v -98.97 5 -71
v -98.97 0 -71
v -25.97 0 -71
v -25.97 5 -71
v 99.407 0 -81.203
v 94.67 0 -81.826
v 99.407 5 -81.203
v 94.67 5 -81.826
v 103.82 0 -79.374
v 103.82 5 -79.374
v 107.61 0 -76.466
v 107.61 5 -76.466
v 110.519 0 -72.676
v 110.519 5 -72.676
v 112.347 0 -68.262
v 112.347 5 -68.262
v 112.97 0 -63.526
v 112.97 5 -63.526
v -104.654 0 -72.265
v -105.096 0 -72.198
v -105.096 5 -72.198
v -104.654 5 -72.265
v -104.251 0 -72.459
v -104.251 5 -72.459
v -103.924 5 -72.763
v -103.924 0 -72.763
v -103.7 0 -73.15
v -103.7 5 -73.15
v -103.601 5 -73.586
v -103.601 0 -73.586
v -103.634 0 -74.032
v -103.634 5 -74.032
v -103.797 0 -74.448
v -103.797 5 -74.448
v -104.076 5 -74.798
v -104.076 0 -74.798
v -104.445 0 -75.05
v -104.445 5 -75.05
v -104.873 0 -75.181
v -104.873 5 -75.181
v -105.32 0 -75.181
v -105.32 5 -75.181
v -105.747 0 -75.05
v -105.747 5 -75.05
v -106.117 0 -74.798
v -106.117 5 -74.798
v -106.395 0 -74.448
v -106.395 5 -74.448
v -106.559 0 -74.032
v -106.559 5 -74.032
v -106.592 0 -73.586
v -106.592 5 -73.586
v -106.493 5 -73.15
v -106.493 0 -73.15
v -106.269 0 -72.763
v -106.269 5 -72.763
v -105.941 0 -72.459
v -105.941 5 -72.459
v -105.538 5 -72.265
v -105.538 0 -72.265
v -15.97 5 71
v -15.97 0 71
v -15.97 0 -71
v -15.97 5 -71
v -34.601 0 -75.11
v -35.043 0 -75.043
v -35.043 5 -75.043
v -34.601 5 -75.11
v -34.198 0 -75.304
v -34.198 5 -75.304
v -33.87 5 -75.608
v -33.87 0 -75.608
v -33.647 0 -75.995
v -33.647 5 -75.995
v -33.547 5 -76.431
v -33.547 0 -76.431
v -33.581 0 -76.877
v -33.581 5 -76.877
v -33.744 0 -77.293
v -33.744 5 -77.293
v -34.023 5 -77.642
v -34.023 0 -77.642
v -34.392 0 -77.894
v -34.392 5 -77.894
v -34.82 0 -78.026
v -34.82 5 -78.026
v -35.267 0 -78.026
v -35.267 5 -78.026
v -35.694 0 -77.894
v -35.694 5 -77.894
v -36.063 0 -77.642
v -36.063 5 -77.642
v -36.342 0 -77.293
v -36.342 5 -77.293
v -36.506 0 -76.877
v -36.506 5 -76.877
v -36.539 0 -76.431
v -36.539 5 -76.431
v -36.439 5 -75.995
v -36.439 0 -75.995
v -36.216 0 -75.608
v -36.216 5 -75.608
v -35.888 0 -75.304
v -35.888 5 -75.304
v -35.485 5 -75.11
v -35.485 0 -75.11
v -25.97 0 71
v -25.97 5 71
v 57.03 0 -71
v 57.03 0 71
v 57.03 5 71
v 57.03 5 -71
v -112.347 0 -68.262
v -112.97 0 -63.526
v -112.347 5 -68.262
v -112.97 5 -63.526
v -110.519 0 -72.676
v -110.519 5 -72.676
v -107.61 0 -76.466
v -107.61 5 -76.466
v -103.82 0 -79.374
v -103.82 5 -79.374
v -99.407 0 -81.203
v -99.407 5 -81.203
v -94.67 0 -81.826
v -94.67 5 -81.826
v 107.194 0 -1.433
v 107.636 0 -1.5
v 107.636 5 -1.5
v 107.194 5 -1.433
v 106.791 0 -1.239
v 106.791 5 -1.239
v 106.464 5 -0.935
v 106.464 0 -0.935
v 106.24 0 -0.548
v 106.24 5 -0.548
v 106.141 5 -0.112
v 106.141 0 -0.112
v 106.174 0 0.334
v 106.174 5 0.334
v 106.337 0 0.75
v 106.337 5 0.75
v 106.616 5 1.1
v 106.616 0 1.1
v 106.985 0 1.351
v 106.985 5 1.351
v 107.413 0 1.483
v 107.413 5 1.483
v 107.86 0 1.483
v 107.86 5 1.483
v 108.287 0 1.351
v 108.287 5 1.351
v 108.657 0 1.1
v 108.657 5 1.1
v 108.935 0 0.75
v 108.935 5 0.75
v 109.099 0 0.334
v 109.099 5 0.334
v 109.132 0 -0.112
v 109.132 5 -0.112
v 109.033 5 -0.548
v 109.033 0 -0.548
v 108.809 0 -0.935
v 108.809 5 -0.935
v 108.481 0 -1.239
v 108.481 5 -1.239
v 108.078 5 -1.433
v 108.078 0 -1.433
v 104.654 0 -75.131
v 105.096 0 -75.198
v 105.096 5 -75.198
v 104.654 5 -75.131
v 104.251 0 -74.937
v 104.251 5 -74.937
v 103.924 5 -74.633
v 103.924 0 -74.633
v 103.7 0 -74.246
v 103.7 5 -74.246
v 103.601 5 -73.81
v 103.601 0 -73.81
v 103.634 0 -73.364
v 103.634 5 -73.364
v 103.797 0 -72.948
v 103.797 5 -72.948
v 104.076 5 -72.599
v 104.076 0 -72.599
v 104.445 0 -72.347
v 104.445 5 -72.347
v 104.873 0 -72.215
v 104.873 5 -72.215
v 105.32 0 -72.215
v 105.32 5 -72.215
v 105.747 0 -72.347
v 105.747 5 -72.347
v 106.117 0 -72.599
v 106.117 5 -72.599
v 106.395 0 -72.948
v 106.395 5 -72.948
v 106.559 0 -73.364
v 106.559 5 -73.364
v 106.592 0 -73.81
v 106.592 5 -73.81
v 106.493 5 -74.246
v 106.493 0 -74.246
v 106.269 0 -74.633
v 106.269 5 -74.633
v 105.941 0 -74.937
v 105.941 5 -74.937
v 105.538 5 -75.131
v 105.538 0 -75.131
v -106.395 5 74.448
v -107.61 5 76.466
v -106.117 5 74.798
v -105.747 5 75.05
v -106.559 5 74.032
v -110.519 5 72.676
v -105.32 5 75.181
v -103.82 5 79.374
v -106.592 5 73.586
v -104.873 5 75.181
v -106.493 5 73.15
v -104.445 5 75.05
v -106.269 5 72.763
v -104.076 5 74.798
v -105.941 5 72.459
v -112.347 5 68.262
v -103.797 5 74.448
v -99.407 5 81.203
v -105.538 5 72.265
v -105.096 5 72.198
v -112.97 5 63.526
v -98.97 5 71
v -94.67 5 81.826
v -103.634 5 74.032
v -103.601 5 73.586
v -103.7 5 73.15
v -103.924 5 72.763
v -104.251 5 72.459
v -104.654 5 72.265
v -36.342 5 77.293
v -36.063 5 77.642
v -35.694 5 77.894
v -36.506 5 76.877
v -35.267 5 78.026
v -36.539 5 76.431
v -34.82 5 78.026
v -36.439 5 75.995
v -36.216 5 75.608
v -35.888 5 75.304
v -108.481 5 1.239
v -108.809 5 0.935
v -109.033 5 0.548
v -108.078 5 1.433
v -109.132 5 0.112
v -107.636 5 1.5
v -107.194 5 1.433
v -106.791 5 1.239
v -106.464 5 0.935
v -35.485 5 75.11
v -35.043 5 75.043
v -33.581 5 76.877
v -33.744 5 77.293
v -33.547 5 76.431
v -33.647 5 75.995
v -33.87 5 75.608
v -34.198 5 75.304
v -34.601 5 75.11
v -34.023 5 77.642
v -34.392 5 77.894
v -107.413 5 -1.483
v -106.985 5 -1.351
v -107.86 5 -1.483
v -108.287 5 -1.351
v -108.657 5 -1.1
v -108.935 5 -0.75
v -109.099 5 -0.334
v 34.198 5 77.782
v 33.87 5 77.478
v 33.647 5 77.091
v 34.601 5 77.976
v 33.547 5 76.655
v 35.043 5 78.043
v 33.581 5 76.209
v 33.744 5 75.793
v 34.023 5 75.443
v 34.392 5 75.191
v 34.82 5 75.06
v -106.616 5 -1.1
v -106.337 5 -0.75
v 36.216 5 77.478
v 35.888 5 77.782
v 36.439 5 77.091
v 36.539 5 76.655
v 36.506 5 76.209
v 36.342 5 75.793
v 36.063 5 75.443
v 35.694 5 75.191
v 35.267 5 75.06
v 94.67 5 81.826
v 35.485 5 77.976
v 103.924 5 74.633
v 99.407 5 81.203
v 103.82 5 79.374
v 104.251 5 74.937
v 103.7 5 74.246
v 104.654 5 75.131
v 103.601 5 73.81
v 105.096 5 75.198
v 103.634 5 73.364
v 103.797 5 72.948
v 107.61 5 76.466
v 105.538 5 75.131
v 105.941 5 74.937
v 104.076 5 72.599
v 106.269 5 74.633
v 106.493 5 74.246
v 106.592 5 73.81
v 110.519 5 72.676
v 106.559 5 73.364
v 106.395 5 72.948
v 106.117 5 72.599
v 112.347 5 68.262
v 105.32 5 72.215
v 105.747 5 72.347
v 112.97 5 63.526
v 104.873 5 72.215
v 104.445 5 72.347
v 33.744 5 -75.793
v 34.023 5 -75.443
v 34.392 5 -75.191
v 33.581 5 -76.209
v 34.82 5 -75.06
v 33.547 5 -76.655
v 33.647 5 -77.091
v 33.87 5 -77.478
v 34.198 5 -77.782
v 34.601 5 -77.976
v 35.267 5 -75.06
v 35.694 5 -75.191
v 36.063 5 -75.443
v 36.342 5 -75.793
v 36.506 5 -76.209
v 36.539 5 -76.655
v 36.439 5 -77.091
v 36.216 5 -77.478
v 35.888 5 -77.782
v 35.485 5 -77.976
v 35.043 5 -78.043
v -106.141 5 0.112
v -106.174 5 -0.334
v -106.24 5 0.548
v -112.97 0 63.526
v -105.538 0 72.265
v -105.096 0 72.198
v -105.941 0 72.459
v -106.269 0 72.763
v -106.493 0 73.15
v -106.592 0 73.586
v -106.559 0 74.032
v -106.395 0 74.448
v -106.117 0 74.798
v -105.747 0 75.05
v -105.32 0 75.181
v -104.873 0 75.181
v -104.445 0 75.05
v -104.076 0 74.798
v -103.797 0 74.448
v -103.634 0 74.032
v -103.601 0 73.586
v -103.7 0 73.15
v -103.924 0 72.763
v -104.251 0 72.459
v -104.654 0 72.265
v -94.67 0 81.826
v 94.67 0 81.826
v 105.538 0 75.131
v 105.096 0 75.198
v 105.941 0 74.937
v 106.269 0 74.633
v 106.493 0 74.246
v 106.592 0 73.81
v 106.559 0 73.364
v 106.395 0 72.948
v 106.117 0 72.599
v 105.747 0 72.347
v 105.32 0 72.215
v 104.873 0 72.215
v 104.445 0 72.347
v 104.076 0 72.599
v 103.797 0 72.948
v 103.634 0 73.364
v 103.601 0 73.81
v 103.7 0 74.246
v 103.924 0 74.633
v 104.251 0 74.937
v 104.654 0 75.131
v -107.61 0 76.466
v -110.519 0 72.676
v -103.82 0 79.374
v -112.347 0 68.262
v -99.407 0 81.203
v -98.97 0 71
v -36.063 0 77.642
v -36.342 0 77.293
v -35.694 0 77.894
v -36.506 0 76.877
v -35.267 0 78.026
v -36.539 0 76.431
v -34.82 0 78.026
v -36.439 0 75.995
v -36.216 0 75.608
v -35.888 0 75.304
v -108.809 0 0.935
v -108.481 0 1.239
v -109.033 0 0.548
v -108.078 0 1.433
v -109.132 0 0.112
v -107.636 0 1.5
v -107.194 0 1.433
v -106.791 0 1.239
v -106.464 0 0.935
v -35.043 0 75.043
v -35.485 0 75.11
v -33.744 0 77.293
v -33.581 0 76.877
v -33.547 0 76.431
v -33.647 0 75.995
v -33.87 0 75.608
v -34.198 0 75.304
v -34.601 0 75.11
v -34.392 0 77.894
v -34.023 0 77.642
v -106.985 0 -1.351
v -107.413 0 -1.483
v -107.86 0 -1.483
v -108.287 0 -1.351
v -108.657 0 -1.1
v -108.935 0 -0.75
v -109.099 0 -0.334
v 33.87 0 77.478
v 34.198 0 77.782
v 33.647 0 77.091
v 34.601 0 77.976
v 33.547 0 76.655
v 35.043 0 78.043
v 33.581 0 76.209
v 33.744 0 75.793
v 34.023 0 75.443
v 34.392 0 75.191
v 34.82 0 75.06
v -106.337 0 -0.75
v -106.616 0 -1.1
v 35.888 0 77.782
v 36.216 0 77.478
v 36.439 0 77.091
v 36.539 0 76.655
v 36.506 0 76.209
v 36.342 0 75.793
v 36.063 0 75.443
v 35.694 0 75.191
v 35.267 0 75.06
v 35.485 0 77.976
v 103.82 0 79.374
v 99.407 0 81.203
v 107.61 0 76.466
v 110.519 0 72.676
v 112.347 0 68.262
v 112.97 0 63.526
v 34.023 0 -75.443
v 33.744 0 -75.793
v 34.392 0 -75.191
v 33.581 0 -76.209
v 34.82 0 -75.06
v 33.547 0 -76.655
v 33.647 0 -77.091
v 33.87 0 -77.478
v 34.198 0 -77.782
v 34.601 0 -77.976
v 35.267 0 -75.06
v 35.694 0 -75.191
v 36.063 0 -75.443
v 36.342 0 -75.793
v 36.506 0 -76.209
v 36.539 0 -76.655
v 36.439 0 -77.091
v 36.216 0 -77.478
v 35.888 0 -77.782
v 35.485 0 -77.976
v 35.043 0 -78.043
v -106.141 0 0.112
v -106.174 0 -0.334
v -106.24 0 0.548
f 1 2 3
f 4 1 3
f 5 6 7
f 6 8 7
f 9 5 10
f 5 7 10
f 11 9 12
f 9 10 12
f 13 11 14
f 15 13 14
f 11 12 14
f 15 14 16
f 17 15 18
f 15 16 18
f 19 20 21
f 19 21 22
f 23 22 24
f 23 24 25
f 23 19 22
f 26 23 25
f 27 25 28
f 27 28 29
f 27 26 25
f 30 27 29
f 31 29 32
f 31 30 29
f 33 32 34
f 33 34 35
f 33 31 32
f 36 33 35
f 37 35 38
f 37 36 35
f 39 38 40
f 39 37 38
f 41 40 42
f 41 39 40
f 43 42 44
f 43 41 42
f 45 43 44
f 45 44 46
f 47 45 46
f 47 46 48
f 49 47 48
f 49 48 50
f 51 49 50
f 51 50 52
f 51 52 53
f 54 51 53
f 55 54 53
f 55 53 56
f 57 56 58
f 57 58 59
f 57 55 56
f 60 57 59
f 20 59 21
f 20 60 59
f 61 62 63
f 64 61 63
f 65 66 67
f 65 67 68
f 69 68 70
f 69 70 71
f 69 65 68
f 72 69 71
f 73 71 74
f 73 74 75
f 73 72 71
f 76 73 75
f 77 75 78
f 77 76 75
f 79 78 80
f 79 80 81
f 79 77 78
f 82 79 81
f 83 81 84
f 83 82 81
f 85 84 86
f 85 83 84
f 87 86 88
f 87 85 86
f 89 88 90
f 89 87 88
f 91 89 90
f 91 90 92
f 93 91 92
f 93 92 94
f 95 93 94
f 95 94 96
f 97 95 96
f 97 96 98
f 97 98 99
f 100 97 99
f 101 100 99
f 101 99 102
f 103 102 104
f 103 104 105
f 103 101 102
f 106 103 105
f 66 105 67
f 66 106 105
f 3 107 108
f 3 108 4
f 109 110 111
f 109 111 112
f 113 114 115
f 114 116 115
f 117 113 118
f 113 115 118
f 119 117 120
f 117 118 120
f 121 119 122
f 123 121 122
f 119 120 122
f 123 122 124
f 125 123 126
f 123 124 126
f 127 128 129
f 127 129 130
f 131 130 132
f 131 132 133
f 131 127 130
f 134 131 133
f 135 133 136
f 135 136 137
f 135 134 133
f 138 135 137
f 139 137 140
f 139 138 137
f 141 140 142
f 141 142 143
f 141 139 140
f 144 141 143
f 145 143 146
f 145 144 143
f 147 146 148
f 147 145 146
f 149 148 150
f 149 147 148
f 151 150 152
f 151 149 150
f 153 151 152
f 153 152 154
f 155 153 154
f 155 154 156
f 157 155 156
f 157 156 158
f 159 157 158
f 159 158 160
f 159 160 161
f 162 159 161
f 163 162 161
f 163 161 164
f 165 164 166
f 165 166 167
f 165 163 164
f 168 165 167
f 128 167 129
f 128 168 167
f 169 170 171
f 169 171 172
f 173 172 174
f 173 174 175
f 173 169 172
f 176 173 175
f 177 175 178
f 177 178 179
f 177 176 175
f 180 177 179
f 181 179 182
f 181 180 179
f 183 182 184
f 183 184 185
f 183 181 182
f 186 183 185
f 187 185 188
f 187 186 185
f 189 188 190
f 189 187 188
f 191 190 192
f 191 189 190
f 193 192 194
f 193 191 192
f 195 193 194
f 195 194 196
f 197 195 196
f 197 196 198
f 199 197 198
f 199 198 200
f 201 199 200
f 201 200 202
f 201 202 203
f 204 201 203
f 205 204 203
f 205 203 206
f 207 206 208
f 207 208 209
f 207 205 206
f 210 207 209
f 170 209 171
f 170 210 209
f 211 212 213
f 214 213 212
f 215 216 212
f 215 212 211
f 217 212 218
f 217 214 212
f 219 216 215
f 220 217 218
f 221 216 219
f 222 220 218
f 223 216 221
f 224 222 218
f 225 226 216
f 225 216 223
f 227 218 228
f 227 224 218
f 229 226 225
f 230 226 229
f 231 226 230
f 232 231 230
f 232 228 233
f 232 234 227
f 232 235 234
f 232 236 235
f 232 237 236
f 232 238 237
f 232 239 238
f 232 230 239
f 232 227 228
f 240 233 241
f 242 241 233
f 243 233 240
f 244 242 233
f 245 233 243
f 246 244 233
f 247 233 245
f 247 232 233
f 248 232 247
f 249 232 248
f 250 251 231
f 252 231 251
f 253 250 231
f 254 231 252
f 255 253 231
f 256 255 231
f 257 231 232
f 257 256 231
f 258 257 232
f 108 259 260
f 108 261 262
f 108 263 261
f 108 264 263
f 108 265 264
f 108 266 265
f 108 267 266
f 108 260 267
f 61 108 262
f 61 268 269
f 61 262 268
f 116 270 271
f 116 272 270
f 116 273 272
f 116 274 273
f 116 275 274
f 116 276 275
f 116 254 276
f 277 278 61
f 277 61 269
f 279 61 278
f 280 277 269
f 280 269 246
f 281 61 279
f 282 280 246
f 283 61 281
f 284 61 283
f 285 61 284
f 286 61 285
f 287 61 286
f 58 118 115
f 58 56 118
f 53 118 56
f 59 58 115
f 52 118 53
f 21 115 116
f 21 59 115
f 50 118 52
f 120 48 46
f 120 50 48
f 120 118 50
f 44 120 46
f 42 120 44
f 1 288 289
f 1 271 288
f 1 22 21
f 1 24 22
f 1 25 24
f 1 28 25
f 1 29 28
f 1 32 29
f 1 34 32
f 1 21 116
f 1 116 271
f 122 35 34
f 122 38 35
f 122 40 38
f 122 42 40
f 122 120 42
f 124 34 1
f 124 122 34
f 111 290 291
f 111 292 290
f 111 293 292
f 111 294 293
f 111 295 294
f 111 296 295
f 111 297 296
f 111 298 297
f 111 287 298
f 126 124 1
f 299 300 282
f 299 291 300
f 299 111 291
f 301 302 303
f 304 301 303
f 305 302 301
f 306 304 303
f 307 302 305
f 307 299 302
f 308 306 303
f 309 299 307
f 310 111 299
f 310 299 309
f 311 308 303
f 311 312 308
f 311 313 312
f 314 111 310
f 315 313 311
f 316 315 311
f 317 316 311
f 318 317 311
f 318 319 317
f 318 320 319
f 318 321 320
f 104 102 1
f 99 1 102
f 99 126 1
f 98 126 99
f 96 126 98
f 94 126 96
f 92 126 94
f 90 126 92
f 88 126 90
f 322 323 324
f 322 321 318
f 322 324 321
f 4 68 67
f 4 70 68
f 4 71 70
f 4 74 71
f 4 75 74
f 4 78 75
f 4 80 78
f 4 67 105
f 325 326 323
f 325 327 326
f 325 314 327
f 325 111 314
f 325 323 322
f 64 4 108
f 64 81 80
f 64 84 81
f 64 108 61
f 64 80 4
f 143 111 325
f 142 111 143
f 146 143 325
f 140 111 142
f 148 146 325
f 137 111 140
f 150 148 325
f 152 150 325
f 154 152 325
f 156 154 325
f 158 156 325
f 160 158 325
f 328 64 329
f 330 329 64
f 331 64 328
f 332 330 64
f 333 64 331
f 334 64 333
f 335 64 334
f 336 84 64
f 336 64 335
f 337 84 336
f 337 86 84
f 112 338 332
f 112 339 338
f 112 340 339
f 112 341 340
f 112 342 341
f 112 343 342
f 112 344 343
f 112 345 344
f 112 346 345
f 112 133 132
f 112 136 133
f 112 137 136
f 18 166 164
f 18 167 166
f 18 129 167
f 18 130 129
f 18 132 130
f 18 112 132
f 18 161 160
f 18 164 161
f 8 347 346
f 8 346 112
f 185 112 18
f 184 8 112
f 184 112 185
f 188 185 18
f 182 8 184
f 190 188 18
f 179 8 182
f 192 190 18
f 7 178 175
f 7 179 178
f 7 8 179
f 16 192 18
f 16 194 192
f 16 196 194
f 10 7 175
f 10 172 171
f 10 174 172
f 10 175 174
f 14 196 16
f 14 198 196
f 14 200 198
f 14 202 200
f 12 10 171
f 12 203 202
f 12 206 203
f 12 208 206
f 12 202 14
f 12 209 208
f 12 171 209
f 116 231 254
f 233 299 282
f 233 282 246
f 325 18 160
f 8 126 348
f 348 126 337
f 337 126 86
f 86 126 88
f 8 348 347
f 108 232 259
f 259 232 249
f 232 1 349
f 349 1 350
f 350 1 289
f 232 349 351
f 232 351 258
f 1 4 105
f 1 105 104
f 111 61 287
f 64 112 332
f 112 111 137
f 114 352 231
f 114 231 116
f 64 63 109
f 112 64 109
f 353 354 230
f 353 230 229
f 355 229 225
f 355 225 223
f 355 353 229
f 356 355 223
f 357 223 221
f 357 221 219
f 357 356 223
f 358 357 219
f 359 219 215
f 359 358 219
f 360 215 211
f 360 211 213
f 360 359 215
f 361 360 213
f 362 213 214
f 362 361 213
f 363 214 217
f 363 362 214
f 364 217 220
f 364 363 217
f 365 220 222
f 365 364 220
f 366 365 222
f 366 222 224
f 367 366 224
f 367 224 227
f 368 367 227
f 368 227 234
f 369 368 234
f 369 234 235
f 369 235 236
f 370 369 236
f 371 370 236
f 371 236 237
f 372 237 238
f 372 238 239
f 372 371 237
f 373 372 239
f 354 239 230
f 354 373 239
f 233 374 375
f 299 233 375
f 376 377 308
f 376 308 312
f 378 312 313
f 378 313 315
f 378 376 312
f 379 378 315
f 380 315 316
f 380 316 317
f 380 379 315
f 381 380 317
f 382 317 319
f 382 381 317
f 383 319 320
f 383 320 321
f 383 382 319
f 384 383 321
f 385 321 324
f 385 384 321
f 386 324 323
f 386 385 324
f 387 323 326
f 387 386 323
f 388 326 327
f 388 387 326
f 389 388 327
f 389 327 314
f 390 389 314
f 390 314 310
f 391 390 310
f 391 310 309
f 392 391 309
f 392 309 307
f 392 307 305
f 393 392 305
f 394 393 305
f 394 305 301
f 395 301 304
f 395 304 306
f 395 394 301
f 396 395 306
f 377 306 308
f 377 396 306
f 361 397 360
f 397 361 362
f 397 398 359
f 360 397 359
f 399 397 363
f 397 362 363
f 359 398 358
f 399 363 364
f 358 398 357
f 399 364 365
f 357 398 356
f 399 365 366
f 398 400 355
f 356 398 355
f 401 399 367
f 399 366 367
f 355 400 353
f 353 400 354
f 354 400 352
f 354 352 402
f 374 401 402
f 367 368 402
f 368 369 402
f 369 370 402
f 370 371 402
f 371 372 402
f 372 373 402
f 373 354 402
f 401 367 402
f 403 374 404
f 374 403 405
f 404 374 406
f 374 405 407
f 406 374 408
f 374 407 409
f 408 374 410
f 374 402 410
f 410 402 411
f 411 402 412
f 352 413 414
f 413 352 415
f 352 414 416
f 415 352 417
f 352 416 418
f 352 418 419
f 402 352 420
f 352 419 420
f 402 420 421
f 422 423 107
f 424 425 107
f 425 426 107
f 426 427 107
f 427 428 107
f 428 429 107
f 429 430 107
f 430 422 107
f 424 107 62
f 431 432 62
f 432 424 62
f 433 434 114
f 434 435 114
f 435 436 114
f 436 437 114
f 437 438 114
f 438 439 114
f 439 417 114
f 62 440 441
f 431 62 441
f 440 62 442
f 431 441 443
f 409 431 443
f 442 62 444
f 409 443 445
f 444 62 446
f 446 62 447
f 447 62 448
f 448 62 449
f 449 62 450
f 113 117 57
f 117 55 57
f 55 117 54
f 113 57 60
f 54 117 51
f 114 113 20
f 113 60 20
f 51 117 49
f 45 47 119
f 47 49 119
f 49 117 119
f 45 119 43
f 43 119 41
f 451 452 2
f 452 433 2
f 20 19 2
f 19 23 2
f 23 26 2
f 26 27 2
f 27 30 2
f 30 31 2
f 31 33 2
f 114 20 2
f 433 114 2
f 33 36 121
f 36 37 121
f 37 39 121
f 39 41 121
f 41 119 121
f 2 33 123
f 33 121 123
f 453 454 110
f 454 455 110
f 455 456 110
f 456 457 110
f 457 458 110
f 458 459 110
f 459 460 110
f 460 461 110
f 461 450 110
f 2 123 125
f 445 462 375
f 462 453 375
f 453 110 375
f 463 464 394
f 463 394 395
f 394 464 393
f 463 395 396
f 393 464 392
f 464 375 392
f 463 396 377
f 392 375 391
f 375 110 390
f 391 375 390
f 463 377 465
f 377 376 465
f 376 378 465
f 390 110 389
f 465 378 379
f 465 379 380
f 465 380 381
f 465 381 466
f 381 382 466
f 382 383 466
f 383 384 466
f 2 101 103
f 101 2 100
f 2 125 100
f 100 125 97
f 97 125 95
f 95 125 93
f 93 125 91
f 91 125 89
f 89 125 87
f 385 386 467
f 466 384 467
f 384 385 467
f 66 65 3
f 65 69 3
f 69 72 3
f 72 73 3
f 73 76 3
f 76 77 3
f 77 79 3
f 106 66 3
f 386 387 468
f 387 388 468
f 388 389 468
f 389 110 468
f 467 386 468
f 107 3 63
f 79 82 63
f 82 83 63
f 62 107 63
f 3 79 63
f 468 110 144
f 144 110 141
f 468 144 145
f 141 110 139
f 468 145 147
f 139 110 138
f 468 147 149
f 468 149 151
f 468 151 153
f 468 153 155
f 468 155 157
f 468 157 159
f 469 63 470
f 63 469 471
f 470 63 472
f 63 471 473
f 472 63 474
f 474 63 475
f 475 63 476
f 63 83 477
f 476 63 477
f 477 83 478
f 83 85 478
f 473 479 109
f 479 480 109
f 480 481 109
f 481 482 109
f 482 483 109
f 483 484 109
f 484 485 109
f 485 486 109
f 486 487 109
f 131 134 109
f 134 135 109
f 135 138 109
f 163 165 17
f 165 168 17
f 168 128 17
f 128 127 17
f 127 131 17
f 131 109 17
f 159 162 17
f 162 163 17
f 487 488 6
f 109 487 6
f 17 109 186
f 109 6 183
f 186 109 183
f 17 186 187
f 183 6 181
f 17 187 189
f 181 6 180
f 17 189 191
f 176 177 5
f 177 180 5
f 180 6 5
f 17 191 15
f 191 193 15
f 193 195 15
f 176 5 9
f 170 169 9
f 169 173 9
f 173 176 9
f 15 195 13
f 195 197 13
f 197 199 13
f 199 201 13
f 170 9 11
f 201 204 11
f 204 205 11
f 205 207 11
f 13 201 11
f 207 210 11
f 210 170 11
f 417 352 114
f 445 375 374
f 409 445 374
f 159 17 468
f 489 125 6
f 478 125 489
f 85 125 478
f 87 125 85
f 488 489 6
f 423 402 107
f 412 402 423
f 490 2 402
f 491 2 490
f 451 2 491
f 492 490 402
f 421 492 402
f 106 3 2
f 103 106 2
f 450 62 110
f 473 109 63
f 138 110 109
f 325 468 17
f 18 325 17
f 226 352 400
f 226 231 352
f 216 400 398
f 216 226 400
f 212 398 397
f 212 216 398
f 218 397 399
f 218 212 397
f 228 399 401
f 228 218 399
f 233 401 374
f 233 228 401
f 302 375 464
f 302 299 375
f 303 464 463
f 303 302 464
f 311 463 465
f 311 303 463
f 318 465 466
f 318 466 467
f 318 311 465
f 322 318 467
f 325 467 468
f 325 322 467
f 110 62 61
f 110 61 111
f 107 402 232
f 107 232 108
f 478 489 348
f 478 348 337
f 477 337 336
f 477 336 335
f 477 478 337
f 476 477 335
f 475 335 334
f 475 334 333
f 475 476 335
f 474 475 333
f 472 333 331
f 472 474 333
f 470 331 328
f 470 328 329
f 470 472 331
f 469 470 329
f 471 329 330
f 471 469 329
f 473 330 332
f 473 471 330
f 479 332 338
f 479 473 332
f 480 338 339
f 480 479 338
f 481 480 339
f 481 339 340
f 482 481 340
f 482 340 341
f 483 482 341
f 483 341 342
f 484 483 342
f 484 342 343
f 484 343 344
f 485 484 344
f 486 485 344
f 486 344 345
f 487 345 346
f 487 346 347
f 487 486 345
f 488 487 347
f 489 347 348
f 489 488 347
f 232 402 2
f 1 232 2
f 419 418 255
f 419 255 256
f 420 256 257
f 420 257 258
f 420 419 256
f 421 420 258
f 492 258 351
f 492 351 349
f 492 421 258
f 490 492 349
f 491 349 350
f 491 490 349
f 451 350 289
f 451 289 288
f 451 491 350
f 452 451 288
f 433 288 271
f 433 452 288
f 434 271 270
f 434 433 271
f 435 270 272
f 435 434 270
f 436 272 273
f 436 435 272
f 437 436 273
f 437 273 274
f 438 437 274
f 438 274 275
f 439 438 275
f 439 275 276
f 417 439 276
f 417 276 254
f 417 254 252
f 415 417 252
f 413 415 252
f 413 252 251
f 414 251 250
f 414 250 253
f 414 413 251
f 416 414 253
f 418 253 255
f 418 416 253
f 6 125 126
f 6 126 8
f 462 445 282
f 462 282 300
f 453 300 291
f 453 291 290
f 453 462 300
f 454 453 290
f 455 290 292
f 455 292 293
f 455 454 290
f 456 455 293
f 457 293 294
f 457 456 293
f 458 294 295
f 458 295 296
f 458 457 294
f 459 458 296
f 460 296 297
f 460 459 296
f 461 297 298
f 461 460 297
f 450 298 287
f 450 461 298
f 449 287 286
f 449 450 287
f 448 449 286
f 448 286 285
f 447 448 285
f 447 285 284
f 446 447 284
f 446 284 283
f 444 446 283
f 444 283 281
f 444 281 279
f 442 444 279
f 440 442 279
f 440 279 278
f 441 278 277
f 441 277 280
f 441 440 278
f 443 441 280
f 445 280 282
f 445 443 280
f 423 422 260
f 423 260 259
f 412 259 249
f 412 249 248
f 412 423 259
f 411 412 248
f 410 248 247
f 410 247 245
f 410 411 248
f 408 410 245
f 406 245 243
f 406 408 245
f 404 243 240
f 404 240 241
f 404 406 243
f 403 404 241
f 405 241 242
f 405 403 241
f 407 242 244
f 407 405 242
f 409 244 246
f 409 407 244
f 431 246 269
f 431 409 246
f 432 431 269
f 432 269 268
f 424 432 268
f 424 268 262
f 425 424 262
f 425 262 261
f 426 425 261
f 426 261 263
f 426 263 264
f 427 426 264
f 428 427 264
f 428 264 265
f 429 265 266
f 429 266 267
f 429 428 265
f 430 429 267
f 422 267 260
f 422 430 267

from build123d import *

# Parameters (mm, degrees)
ESQUISSE1_W        = 225.94062
ESQUISSE1_H        = 163.6522
ESQUISSE1_R        = 1.5
ESQUISSE1_W_2      = 73
ESQUISSE1_H_2      = 142
BOSS_EXTRU_1_DEPTH = 5
CONG_2_R           = 18.3


with BuildPart() as part:
    # Esquisse1 → Boss.-Extru.1 (new body)
    with BuildSketch(Plane(origin=(0, 0, 0), x_dir=(1, 0, 0), z_dir=(0, 1, 0))):
        Rectangle(ESQUISSE1_W, ESQUISSE1_H)
        with Locations(Location((-105.09631, 73.6981, 0), (0, 0, 270))):
            Circle(ESQUISSE1_R, mode=Mode.SUBTRACT)
        with Locations(Location((-35.04311, 76.5429, 0), (0, 0, 270))):
            Circle(ESQUISSE1_R, mode=Mode.SUBTRACT)
        with Locations(Location((-107.63631, 0, 0), (0, 0, 270))):
            Circle(ESQUISSE1_R, mode=Mode.SUBTRACT)
        with Locations(Location((107.63631, 0, 0), (0, 0, 90))):
            Circle(ESQUISSE1_R, mode=Mode.SUBTRACT)
        with Locations(Location((35.04311, 76.5429, 0), (0, 0, 90))):
            Circle(ESQUISSE1_R, mode=Mode.SUBTRACT)
        with Locations(Location((105.09631, 73.6981, 0), (0, 0, 90))):
            Circle(ESQUISSE1_R, mode=Mode.SUBTRACT)
        with Locations(Location((105.09631, -73.6981, 0), (0, 0, 270))):
            Circle(ESQUISSE1_R, mode=Mode.SUBTRACT)
        with Locations(Location((35.04311, -76.5429, 0), (0, 0, 270))):
            Circle(ESQUISSE1_R, mode=Mode.SUBTRACT)
        with Locations(Location((-35.04311, -76.5429, 0), (0, 0, 90))):
            Circle(ESQUISSE1_R, mode=Mode.SUBTRACT)
        with Locations(Location((-105.09631, -73.6981, 0), (0, 0, 90))):
            Circle(ESQUISSE1_R, mode=Mode.SUBTRACT)
        with Locations((-62.47031, 0)):
            Rectangle(ESQUISSE1_W_2, ESQUISSE1_H_2, mode=Mode.SUBTRACT)
        with Locations((20.52969, 0)):
            Rectangle(ESQUISSE1_W_2, ESQUISSE1_H_2, mode=Mode.SUBTRACT)
    extrude(amount=BOSS_EXTRU_1_DEPTH)

    # Congé2
    cong_2_edges = [part.edges().sort_by_distance(p)[0] for p in [
        (-112.97031, 2.5, -81.8261),
        (112.97031, 2.5, -81.8261),
        (112.97031, 2.5, 81.8261),
        (-112.97031, 2.5, 81.8261),
    ]]
    fillet(cong_2_edges, radius=CONG_2_R)


solid = part.part
